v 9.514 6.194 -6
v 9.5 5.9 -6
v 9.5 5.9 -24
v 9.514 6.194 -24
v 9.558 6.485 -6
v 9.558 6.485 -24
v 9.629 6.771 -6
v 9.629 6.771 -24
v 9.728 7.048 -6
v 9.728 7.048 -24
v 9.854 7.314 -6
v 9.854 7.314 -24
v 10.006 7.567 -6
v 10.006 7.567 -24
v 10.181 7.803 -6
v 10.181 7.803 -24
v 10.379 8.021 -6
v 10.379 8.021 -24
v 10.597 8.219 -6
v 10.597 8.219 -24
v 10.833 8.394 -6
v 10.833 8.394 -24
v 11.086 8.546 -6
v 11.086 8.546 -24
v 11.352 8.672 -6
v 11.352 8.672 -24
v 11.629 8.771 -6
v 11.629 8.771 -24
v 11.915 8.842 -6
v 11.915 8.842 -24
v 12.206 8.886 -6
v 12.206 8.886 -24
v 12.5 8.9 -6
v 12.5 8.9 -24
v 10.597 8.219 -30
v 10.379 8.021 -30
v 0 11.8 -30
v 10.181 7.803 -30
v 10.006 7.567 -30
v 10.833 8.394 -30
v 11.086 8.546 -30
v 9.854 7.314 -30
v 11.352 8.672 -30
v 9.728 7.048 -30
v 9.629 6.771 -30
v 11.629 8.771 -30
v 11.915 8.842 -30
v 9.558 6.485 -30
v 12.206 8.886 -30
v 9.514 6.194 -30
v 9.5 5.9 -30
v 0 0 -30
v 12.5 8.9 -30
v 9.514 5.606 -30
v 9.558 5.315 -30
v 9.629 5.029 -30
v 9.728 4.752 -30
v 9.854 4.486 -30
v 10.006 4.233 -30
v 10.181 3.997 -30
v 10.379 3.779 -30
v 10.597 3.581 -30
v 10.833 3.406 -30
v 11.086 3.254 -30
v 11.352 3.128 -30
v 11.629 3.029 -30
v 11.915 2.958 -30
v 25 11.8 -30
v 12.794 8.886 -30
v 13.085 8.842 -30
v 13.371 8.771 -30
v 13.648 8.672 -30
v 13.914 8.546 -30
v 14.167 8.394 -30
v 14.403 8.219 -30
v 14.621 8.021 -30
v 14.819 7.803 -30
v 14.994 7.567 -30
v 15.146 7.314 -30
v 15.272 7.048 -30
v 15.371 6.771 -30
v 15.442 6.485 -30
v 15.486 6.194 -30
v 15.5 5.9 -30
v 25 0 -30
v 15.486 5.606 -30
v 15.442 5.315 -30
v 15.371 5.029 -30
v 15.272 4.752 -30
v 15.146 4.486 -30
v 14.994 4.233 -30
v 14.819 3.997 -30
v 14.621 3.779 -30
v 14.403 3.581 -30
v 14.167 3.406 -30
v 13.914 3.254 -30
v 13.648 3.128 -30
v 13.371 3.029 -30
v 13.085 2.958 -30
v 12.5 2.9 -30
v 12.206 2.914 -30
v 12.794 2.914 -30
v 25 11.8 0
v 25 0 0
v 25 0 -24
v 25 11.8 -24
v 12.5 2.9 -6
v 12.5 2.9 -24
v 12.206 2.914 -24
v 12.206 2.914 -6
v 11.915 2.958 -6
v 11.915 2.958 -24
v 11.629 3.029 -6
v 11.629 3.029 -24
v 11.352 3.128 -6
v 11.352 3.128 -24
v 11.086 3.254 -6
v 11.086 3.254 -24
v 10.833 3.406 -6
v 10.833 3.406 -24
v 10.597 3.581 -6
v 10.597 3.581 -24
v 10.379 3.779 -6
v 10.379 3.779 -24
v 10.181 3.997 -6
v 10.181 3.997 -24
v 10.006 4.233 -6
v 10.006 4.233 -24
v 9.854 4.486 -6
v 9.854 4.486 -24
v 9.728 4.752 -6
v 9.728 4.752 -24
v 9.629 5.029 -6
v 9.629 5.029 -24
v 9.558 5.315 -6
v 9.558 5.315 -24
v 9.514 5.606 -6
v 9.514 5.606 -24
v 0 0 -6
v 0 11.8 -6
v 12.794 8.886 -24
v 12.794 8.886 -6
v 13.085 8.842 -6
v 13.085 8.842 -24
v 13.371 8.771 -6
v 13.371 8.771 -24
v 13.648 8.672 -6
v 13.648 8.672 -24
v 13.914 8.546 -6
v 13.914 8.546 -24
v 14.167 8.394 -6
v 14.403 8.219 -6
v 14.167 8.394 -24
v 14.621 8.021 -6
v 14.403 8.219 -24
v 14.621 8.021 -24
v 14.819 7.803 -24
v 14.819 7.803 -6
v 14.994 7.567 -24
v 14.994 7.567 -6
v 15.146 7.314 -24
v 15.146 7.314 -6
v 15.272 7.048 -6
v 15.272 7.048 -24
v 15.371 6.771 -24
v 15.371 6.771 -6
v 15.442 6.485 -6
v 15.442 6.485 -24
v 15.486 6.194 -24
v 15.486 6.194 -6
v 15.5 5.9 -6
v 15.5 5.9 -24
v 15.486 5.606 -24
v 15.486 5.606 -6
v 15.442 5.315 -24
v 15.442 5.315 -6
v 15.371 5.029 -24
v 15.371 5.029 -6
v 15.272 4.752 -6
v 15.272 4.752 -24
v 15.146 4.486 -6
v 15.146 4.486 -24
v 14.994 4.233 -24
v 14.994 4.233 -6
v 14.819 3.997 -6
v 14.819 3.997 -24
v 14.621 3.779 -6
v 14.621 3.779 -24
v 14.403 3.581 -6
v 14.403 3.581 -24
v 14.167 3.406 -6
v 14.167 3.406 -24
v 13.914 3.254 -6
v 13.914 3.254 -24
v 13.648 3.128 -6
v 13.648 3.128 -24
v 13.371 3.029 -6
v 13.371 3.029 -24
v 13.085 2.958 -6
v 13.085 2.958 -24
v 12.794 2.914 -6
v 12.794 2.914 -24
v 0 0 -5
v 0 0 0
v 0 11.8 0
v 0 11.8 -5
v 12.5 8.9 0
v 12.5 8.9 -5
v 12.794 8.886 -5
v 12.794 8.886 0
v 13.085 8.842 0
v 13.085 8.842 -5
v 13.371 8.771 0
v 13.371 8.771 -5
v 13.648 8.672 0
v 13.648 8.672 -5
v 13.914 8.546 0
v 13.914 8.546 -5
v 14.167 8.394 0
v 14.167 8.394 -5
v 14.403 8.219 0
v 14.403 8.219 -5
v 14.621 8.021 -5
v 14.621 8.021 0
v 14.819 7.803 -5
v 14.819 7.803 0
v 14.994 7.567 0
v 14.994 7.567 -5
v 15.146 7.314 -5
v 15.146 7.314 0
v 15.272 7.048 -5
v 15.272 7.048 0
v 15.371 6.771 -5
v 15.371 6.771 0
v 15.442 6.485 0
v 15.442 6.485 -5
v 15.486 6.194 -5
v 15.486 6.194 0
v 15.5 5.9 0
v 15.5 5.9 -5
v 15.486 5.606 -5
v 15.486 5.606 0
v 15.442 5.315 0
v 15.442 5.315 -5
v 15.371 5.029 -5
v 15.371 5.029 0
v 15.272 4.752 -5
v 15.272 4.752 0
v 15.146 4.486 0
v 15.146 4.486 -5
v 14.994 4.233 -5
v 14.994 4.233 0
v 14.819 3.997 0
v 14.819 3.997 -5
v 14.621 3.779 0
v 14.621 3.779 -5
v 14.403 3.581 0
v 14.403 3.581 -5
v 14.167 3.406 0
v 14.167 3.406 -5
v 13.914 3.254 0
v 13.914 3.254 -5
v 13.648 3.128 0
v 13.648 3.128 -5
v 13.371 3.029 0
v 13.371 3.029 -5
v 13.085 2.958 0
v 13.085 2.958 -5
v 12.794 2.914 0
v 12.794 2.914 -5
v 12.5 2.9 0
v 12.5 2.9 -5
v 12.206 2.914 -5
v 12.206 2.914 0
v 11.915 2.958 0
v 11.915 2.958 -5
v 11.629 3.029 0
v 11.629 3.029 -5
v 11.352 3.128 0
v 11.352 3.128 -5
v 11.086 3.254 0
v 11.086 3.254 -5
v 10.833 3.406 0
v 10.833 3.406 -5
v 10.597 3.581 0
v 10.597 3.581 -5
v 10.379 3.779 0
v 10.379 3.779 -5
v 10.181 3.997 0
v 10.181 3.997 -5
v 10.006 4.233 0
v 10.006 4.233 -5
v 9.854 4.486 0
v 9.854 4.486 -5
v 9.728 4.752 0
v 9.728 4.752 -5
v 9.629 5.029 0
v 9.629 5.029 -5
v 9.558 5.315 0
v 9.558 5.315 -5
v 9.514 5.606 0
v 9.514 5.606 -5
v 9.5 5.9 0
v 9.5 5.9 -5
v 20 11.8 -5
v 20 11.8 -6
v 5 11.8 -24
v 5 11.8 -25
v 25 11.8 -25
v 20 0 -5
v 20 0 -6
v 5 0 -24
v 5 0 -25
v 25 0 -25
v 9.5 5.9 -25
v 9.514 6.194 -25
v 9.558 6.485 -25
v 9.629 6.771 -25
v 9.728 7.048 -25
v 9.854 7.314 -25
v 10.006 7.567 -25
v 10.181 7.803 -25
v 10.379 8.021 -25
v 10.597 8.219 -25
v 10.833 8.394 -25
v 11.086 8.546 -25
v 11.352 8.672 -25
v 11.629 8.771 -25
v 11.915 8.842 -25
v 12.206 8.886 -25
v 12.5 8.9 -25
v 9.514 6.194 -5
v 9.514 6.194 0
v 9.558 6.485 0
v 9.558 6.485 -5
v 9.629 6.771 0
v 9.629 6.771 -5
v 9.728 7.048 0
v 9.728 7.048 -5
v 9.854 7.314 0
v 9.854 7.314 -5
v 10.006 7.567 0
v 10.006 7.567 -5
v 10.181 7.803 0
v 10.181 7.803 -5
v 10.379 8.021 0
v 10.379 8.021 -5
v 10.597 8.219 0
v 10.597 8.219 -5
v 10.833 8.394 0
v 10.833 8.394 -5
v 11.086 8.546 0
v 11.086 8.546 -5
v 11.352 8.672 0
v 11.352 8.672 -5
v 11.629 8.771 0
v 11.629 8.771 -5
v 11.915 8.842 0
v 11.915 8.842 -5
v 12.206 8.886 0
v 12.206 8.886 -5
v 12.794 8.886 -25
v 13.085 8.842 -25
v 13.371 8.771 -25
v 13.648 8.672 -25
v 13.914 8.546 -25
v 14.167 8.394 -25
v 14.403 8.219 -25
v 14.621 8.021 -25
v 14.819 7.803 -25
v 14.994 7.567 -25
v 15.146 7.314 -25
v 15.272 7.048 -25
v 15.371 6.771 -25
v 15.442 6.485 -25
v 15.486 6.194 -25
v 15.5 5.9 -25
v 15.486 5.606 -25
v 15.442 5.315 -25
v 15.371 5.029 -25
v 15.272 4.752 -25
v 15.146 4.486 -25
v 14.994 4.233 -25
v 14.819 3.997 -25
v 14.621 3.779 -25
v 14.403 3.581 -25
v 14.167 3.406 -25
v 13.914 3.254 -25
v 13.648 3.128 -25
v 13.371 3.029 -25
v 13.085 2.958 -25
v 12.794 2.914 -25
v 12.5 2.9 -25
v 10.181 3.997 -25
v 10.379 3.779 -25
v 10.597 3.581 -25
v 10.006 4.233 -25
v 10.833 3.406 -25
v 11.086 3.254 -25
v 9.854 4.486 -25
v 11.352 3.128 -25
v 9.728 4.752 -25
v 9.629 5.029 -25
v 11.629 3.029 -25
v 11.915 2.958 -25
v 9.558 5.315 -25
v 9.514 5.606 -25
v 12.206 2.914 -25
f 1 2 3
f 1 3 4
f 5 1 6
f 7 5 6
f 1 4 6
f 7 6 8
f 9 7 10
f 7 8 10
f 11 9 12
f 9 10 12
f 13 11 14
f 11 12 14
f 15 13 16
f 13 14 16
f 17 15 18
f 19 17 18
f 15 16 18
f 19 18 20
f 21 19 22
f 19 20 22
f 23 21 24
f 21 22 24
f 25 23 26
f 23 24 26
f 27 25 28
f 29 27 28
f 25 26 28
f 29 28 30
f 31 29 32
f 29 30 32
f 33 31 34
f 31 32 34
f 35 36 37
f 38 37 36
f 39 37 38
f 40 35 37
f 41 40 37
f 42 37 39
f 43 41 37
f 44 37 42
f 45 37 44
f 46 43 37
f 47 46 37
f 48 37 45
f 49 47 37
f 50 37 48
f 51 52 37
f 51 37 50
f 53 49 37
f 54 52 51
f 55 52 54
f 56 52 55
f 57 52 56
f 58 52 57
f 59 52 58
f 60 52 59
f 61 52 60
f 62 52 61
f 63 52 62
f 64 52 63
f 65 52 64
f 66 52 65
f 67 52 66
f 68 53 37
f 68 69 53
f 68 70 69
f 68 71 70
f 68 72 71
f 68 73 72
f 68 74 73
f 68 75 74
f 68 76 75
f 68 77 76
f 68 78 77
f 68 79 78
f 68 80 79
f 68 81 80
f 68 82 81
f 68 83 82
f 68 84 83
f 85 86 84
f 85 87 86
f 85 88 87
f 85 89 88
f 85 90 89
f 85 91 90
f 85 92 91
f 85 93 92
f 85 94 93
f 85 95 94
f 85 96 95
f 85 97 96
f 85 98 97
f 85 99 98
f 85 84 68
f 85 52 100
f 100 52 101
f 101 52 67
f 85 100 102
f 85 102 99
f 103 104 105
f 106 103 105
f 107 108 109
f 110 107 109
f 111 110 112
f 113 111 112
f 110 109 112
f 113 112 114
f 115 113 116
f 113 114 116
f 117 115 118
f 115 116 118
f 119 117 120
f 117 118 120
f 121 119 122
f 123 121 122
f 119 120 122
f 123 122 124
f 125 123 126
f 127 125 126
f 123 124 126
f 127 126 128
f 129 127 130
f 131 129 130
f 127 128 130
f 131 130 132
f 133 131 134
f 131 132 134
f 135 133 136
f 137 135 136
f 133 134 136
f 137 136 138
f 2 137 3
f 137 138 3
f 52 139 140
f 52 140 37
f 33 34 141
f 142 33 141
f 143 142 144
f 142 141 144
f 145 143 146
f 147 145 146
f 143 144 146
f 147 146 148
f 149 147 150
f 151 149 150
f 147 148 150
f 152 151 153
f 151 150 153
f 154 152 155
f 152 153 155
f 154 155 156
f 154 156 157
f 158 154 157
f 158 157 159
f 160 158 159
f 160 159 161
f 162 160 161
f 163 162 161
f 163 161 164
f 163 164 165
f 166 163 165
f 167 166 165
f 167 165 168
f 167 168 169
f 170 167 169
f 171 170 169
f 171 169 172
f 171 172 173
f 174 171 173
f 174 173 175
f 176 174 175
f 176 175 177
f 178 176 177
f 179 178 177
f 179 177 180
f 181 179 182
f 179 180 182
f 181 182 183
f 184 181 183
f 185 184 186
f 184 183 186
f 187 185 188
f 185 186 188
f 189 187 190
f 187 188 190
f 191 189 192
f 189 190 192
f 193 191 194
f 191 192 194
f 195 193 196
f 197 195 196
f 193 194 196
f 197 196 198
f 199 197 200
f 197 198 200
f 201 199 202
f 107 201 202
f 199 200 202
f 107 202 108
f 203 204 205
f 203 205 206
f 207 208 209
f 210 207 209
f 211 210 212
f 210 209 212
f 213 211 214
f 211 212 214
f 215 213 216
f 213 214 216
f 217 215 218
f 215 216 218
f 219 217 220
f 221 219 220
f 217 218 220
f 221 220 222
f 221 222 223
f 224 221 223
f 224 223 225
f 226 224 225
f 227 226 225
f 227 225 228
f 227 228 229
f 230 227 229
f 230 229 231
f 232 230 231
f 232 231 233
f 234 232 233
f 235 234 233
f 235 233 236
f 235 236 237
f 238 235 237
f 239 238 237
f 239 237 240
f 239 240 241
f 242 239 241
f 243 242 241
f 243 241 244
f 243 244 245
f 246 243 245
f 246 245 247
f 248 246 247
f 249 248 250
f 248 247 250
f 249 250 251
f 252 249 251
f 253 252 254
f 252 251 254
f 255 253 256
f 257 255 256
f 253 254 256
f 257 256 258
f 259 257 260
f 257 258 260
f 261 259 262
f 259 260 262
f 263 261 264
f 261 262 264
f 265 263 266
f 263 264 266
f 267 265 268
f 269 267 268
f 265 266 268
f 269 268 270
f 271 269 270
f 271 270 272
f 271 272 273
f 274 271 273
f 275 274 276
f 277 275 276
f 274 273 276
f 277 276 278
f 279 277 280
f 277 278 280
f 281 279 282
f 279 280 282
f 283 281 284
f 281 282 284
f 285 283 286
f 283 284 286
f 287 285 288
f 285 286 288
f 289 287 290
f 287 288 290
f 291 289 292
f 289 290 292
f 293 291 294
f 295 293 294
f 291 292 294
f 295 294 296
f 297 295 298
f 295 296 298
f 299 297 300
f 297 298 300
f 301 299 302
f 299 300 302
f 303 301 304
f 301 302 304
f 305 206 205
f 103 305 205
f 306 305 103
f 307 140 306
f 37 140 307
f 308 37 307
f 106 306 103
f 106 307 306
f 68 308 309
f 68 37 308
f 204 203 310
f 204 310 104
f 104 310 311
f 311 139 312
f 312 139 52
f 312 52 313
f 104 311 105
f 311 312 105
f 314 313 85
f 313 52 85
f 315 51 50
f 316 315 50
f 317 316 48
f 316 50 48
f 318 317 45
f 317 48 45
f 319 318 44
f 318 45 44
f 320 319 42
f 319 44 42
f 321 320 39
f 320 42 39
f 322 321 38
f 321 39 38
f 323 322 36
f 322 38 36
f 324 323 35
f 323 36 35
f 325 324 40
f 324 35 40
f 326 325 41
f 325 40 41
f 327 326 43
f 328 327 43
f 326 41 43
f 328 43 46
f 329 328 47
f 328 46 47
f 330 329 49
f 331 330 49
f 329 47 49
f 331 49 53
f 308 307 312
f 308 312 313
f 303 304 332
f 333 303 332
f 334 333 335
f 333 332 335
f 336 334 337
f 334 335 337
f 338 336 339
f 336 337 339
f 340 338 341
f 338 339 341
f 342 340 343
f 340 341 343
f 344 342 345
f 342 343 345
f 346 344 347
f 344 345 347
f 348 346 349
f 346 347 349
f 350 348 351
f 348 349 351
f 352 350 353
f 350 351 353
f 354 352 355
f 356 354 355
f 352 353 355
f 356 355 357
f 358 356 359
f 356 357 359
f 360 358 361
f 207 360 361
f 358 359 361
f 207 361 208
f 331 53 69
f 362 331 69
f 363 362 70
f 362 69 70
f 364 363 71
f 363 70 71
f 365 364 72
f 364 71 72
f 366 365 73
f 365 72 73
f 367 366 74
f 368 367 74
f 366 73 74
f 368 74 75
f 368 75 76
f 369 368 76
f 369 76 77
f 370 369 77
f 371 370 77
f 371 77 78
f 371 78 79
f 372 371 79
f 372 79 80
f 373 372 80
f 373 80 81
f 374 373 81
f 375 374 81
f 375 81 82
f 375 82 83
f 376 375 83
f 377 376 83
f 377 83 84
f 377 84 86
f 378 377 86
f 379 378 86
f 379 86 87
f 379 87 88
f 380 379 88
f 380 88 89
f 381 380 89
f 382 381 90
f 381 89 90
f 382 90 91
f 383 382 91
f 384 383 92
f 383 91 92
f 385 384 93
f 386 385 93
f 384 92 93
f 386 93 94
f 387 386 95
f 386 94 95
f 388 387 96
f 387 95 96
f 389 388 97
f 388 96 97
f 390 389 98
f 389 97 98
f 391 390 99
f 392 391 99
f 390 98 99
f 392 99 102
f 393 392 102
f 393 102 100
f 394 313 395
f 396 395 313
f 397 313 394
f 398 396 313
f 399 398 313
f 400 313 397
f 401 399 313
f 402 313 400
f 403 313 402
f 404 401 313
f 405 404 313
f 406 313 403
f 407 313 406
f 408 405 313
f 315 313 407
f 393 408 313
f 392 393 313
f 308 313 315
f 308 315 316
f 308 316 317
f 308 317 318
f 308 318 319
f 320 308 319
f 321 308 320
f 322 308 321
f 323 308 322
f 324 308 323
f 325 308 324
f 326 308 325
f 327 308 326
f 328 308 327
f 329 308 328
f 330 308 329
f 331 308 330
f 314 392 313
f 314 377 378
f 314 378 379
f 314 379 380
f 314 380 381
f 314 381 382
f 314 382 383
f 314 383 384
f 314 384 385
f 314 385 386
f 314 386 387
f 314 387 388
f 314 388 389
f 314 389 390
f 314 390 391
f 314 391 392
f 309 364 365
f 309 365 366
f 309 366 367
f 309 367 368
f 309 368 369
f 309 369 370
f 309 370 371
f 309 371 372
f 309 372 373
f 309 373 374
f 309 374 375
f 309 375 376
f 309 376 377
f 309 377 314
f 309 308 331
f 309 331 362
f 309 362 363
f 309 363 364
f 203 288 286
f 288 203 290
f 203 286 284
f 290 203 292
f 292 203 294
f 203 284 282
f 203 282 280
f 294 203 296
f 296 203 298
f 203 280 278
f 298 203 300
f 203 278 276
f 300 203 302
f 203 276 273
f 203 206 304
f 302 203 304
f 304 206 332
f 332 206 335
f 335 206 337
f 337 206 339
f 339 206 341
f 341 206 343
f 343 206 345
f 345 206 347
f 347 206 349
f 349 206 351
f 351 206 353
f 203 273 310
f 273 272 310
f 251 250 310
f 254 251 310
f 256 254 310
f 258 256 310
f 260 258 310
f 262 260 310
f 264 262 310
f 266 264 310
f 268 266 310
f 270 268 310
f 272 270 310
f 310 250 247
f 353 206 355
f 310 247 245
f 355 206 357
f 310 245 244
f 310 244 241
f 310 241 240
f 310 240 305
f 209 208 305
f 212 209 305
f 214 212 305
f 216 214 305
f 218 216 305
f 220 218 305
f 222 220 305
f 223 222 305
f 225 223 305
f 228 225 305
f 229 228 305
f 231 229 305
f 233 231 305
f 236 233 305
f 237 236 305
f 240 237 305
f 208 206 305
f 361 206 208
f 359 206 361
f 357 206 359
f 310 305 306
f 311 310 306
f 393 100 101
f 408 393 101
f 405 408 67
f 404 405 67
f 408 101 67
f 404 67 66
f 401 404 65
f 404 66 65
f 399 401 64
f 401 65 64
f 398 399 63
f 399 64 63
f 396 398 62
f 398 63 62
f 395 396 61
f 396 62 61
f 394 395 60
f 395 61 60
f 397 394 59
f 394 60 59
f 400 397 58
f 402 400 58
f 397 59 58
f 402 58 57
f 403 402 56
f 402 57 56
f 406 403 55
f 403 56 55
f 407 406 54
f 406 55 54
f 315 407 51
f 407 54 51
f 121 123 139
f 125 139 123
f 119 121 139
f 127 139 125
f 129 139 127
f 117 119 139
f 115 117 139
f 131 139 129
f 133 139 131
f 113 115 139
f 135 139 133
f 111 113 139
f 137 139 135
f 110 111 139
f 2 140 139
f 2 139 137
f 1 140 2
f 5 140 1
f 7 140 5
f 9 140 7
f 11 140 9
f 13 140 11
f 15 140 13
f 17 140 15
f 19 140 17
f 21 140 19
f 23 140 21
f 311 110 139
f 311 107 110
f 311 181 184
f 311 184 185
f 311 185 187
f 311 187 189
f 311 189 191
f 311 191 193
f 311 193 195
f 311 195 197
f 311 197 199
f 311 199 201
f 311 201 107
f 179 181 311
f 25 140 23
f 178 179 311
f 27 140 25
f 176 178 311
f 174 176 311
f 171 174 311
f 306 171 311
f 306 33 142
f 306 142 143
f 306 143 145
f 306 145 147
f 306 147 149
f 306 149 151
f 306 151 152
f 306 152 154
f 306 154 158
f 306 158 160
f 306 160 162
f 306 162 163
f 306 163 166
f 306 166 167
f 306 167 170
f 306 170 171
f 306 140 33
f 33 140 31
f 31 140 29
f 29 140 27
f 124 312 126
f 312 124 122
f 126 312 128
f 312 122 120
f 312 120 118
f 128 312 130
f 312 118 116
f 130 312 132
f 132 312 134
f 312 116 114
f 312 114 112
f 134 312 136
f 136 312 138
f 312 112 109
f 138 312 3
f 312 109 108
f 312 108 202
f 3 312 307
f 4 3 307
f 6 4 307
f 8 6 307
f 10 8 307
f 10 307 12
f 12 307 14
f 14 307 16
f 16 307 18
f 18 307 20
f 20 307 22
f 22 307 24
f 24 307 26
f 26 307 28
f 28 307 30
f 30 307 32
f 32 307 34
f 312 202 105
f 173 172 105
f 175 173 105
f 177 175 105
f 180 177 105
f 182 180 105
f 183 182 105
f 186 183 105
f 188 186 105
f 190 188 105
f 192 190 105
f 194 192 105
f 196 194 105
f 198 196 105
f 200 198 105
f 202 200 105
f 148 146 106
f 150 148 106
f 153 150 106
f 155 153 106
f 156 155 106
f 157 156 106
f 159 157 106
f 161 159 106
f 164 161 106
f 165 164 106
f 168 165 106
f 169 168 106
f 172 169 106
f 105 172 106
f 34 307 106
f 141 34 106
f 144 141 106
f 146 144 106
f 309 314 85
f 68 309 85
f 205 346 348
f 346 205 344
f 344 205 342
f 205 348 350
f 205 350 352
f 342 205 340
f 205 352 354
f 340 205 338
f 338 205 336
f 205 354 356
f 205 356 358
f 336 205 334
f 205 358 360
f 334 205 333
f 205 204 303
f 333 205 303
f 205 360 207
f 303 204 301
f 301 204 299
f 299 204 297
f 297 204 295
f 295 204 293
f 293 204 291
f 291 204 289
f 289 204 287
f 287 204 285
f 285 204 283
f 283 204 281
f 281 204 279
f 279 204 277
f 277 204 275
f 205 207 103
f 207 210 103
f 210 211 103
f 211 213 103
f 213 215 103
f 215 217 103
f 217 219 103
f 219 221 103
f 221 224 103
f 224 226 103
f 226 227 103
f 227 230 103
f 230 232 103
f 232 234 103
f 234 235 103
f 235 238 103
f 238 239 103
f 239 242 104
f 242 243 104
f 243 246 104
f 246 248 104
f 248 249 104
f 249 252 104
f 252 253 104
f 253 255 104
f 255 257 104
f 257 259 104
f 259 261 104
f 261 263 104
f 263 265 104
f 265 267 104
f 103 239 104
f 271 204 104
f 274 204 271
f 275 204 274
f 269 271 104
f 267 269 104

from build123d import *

# Parameters (mm, degrees)
SKETCH_1_W          = 25
SKETCH_1_H          = 30
EXTRUDE_1_DEPTH     = 11.8
SKETCH_2_W          = 20
SKETCH_2_H          = 1
CUT_EXTRUDE_1_DEPTH = 13.5
CUT_EXTRUDE_2_DEPTH = 30


with BuildPart() as part:
    # 草图1 → 凸台-拉伸1 (new body)
    with BuildSketch(Plane(origin=(0, 0, 0), x_dir=(1, 0, 0), z_dir=(0, 1, 0))):
        with Locations((12.5, 15)):
            Rectangle(SKETCH_1_W, SKETCH_1_H)
    extrude(amount=EXTRUDE_1_DEPTH)

    # 草图2 → 切除-拉伸1 (cut)
    with BuildSketch(Plane(origin=(0, 11.8, 0), x_dir=(1, 0, 0), z_dir=(0, 1, 0))):
        with Locations((15, 24.5)):
            Rectangle(SKETCH_2_W, SKETCH_2_H)
        with Locations((10, 5.5)):
            Rectangle(SKETCH_2_W, SKETCH_2_H)
    extrude(amount=-CUT_EXTRUDE_1_DEPTH, mode=Mode.SUBTRACT)

    # 草图3 → 切除-拉伸2 (cut)
    with BuildSketch(Plane(origin=(0, 0, -30), x_dir=(-1, 0, 0), z_dir=(0, 0, -1))):
        with BuildLine():
            ThreePointArc((-9.5, 5.9), (-10.378679656, 8.021320344), (-12.5, 8.9))
            Line((-12.5, 8.9), (-12.5, 2.9))
            ThreePointArc((-12.5, 2.9), (-10.378679656, 3.778679656), (-9.5, 5.9))
        make_face()
        with BuildLine():
            Line((-12.5, 2.9), (-12.5, 8.9))
            ThreePointArc((-12.5, 8.9), (-15.5, 5.9), (-12.5, 2.9))
        make_face()
    extrude(amount=-CUT_EXTRUDE_2_DEPTH, mode=Mode.SUBTRACT)


solid = part.part
